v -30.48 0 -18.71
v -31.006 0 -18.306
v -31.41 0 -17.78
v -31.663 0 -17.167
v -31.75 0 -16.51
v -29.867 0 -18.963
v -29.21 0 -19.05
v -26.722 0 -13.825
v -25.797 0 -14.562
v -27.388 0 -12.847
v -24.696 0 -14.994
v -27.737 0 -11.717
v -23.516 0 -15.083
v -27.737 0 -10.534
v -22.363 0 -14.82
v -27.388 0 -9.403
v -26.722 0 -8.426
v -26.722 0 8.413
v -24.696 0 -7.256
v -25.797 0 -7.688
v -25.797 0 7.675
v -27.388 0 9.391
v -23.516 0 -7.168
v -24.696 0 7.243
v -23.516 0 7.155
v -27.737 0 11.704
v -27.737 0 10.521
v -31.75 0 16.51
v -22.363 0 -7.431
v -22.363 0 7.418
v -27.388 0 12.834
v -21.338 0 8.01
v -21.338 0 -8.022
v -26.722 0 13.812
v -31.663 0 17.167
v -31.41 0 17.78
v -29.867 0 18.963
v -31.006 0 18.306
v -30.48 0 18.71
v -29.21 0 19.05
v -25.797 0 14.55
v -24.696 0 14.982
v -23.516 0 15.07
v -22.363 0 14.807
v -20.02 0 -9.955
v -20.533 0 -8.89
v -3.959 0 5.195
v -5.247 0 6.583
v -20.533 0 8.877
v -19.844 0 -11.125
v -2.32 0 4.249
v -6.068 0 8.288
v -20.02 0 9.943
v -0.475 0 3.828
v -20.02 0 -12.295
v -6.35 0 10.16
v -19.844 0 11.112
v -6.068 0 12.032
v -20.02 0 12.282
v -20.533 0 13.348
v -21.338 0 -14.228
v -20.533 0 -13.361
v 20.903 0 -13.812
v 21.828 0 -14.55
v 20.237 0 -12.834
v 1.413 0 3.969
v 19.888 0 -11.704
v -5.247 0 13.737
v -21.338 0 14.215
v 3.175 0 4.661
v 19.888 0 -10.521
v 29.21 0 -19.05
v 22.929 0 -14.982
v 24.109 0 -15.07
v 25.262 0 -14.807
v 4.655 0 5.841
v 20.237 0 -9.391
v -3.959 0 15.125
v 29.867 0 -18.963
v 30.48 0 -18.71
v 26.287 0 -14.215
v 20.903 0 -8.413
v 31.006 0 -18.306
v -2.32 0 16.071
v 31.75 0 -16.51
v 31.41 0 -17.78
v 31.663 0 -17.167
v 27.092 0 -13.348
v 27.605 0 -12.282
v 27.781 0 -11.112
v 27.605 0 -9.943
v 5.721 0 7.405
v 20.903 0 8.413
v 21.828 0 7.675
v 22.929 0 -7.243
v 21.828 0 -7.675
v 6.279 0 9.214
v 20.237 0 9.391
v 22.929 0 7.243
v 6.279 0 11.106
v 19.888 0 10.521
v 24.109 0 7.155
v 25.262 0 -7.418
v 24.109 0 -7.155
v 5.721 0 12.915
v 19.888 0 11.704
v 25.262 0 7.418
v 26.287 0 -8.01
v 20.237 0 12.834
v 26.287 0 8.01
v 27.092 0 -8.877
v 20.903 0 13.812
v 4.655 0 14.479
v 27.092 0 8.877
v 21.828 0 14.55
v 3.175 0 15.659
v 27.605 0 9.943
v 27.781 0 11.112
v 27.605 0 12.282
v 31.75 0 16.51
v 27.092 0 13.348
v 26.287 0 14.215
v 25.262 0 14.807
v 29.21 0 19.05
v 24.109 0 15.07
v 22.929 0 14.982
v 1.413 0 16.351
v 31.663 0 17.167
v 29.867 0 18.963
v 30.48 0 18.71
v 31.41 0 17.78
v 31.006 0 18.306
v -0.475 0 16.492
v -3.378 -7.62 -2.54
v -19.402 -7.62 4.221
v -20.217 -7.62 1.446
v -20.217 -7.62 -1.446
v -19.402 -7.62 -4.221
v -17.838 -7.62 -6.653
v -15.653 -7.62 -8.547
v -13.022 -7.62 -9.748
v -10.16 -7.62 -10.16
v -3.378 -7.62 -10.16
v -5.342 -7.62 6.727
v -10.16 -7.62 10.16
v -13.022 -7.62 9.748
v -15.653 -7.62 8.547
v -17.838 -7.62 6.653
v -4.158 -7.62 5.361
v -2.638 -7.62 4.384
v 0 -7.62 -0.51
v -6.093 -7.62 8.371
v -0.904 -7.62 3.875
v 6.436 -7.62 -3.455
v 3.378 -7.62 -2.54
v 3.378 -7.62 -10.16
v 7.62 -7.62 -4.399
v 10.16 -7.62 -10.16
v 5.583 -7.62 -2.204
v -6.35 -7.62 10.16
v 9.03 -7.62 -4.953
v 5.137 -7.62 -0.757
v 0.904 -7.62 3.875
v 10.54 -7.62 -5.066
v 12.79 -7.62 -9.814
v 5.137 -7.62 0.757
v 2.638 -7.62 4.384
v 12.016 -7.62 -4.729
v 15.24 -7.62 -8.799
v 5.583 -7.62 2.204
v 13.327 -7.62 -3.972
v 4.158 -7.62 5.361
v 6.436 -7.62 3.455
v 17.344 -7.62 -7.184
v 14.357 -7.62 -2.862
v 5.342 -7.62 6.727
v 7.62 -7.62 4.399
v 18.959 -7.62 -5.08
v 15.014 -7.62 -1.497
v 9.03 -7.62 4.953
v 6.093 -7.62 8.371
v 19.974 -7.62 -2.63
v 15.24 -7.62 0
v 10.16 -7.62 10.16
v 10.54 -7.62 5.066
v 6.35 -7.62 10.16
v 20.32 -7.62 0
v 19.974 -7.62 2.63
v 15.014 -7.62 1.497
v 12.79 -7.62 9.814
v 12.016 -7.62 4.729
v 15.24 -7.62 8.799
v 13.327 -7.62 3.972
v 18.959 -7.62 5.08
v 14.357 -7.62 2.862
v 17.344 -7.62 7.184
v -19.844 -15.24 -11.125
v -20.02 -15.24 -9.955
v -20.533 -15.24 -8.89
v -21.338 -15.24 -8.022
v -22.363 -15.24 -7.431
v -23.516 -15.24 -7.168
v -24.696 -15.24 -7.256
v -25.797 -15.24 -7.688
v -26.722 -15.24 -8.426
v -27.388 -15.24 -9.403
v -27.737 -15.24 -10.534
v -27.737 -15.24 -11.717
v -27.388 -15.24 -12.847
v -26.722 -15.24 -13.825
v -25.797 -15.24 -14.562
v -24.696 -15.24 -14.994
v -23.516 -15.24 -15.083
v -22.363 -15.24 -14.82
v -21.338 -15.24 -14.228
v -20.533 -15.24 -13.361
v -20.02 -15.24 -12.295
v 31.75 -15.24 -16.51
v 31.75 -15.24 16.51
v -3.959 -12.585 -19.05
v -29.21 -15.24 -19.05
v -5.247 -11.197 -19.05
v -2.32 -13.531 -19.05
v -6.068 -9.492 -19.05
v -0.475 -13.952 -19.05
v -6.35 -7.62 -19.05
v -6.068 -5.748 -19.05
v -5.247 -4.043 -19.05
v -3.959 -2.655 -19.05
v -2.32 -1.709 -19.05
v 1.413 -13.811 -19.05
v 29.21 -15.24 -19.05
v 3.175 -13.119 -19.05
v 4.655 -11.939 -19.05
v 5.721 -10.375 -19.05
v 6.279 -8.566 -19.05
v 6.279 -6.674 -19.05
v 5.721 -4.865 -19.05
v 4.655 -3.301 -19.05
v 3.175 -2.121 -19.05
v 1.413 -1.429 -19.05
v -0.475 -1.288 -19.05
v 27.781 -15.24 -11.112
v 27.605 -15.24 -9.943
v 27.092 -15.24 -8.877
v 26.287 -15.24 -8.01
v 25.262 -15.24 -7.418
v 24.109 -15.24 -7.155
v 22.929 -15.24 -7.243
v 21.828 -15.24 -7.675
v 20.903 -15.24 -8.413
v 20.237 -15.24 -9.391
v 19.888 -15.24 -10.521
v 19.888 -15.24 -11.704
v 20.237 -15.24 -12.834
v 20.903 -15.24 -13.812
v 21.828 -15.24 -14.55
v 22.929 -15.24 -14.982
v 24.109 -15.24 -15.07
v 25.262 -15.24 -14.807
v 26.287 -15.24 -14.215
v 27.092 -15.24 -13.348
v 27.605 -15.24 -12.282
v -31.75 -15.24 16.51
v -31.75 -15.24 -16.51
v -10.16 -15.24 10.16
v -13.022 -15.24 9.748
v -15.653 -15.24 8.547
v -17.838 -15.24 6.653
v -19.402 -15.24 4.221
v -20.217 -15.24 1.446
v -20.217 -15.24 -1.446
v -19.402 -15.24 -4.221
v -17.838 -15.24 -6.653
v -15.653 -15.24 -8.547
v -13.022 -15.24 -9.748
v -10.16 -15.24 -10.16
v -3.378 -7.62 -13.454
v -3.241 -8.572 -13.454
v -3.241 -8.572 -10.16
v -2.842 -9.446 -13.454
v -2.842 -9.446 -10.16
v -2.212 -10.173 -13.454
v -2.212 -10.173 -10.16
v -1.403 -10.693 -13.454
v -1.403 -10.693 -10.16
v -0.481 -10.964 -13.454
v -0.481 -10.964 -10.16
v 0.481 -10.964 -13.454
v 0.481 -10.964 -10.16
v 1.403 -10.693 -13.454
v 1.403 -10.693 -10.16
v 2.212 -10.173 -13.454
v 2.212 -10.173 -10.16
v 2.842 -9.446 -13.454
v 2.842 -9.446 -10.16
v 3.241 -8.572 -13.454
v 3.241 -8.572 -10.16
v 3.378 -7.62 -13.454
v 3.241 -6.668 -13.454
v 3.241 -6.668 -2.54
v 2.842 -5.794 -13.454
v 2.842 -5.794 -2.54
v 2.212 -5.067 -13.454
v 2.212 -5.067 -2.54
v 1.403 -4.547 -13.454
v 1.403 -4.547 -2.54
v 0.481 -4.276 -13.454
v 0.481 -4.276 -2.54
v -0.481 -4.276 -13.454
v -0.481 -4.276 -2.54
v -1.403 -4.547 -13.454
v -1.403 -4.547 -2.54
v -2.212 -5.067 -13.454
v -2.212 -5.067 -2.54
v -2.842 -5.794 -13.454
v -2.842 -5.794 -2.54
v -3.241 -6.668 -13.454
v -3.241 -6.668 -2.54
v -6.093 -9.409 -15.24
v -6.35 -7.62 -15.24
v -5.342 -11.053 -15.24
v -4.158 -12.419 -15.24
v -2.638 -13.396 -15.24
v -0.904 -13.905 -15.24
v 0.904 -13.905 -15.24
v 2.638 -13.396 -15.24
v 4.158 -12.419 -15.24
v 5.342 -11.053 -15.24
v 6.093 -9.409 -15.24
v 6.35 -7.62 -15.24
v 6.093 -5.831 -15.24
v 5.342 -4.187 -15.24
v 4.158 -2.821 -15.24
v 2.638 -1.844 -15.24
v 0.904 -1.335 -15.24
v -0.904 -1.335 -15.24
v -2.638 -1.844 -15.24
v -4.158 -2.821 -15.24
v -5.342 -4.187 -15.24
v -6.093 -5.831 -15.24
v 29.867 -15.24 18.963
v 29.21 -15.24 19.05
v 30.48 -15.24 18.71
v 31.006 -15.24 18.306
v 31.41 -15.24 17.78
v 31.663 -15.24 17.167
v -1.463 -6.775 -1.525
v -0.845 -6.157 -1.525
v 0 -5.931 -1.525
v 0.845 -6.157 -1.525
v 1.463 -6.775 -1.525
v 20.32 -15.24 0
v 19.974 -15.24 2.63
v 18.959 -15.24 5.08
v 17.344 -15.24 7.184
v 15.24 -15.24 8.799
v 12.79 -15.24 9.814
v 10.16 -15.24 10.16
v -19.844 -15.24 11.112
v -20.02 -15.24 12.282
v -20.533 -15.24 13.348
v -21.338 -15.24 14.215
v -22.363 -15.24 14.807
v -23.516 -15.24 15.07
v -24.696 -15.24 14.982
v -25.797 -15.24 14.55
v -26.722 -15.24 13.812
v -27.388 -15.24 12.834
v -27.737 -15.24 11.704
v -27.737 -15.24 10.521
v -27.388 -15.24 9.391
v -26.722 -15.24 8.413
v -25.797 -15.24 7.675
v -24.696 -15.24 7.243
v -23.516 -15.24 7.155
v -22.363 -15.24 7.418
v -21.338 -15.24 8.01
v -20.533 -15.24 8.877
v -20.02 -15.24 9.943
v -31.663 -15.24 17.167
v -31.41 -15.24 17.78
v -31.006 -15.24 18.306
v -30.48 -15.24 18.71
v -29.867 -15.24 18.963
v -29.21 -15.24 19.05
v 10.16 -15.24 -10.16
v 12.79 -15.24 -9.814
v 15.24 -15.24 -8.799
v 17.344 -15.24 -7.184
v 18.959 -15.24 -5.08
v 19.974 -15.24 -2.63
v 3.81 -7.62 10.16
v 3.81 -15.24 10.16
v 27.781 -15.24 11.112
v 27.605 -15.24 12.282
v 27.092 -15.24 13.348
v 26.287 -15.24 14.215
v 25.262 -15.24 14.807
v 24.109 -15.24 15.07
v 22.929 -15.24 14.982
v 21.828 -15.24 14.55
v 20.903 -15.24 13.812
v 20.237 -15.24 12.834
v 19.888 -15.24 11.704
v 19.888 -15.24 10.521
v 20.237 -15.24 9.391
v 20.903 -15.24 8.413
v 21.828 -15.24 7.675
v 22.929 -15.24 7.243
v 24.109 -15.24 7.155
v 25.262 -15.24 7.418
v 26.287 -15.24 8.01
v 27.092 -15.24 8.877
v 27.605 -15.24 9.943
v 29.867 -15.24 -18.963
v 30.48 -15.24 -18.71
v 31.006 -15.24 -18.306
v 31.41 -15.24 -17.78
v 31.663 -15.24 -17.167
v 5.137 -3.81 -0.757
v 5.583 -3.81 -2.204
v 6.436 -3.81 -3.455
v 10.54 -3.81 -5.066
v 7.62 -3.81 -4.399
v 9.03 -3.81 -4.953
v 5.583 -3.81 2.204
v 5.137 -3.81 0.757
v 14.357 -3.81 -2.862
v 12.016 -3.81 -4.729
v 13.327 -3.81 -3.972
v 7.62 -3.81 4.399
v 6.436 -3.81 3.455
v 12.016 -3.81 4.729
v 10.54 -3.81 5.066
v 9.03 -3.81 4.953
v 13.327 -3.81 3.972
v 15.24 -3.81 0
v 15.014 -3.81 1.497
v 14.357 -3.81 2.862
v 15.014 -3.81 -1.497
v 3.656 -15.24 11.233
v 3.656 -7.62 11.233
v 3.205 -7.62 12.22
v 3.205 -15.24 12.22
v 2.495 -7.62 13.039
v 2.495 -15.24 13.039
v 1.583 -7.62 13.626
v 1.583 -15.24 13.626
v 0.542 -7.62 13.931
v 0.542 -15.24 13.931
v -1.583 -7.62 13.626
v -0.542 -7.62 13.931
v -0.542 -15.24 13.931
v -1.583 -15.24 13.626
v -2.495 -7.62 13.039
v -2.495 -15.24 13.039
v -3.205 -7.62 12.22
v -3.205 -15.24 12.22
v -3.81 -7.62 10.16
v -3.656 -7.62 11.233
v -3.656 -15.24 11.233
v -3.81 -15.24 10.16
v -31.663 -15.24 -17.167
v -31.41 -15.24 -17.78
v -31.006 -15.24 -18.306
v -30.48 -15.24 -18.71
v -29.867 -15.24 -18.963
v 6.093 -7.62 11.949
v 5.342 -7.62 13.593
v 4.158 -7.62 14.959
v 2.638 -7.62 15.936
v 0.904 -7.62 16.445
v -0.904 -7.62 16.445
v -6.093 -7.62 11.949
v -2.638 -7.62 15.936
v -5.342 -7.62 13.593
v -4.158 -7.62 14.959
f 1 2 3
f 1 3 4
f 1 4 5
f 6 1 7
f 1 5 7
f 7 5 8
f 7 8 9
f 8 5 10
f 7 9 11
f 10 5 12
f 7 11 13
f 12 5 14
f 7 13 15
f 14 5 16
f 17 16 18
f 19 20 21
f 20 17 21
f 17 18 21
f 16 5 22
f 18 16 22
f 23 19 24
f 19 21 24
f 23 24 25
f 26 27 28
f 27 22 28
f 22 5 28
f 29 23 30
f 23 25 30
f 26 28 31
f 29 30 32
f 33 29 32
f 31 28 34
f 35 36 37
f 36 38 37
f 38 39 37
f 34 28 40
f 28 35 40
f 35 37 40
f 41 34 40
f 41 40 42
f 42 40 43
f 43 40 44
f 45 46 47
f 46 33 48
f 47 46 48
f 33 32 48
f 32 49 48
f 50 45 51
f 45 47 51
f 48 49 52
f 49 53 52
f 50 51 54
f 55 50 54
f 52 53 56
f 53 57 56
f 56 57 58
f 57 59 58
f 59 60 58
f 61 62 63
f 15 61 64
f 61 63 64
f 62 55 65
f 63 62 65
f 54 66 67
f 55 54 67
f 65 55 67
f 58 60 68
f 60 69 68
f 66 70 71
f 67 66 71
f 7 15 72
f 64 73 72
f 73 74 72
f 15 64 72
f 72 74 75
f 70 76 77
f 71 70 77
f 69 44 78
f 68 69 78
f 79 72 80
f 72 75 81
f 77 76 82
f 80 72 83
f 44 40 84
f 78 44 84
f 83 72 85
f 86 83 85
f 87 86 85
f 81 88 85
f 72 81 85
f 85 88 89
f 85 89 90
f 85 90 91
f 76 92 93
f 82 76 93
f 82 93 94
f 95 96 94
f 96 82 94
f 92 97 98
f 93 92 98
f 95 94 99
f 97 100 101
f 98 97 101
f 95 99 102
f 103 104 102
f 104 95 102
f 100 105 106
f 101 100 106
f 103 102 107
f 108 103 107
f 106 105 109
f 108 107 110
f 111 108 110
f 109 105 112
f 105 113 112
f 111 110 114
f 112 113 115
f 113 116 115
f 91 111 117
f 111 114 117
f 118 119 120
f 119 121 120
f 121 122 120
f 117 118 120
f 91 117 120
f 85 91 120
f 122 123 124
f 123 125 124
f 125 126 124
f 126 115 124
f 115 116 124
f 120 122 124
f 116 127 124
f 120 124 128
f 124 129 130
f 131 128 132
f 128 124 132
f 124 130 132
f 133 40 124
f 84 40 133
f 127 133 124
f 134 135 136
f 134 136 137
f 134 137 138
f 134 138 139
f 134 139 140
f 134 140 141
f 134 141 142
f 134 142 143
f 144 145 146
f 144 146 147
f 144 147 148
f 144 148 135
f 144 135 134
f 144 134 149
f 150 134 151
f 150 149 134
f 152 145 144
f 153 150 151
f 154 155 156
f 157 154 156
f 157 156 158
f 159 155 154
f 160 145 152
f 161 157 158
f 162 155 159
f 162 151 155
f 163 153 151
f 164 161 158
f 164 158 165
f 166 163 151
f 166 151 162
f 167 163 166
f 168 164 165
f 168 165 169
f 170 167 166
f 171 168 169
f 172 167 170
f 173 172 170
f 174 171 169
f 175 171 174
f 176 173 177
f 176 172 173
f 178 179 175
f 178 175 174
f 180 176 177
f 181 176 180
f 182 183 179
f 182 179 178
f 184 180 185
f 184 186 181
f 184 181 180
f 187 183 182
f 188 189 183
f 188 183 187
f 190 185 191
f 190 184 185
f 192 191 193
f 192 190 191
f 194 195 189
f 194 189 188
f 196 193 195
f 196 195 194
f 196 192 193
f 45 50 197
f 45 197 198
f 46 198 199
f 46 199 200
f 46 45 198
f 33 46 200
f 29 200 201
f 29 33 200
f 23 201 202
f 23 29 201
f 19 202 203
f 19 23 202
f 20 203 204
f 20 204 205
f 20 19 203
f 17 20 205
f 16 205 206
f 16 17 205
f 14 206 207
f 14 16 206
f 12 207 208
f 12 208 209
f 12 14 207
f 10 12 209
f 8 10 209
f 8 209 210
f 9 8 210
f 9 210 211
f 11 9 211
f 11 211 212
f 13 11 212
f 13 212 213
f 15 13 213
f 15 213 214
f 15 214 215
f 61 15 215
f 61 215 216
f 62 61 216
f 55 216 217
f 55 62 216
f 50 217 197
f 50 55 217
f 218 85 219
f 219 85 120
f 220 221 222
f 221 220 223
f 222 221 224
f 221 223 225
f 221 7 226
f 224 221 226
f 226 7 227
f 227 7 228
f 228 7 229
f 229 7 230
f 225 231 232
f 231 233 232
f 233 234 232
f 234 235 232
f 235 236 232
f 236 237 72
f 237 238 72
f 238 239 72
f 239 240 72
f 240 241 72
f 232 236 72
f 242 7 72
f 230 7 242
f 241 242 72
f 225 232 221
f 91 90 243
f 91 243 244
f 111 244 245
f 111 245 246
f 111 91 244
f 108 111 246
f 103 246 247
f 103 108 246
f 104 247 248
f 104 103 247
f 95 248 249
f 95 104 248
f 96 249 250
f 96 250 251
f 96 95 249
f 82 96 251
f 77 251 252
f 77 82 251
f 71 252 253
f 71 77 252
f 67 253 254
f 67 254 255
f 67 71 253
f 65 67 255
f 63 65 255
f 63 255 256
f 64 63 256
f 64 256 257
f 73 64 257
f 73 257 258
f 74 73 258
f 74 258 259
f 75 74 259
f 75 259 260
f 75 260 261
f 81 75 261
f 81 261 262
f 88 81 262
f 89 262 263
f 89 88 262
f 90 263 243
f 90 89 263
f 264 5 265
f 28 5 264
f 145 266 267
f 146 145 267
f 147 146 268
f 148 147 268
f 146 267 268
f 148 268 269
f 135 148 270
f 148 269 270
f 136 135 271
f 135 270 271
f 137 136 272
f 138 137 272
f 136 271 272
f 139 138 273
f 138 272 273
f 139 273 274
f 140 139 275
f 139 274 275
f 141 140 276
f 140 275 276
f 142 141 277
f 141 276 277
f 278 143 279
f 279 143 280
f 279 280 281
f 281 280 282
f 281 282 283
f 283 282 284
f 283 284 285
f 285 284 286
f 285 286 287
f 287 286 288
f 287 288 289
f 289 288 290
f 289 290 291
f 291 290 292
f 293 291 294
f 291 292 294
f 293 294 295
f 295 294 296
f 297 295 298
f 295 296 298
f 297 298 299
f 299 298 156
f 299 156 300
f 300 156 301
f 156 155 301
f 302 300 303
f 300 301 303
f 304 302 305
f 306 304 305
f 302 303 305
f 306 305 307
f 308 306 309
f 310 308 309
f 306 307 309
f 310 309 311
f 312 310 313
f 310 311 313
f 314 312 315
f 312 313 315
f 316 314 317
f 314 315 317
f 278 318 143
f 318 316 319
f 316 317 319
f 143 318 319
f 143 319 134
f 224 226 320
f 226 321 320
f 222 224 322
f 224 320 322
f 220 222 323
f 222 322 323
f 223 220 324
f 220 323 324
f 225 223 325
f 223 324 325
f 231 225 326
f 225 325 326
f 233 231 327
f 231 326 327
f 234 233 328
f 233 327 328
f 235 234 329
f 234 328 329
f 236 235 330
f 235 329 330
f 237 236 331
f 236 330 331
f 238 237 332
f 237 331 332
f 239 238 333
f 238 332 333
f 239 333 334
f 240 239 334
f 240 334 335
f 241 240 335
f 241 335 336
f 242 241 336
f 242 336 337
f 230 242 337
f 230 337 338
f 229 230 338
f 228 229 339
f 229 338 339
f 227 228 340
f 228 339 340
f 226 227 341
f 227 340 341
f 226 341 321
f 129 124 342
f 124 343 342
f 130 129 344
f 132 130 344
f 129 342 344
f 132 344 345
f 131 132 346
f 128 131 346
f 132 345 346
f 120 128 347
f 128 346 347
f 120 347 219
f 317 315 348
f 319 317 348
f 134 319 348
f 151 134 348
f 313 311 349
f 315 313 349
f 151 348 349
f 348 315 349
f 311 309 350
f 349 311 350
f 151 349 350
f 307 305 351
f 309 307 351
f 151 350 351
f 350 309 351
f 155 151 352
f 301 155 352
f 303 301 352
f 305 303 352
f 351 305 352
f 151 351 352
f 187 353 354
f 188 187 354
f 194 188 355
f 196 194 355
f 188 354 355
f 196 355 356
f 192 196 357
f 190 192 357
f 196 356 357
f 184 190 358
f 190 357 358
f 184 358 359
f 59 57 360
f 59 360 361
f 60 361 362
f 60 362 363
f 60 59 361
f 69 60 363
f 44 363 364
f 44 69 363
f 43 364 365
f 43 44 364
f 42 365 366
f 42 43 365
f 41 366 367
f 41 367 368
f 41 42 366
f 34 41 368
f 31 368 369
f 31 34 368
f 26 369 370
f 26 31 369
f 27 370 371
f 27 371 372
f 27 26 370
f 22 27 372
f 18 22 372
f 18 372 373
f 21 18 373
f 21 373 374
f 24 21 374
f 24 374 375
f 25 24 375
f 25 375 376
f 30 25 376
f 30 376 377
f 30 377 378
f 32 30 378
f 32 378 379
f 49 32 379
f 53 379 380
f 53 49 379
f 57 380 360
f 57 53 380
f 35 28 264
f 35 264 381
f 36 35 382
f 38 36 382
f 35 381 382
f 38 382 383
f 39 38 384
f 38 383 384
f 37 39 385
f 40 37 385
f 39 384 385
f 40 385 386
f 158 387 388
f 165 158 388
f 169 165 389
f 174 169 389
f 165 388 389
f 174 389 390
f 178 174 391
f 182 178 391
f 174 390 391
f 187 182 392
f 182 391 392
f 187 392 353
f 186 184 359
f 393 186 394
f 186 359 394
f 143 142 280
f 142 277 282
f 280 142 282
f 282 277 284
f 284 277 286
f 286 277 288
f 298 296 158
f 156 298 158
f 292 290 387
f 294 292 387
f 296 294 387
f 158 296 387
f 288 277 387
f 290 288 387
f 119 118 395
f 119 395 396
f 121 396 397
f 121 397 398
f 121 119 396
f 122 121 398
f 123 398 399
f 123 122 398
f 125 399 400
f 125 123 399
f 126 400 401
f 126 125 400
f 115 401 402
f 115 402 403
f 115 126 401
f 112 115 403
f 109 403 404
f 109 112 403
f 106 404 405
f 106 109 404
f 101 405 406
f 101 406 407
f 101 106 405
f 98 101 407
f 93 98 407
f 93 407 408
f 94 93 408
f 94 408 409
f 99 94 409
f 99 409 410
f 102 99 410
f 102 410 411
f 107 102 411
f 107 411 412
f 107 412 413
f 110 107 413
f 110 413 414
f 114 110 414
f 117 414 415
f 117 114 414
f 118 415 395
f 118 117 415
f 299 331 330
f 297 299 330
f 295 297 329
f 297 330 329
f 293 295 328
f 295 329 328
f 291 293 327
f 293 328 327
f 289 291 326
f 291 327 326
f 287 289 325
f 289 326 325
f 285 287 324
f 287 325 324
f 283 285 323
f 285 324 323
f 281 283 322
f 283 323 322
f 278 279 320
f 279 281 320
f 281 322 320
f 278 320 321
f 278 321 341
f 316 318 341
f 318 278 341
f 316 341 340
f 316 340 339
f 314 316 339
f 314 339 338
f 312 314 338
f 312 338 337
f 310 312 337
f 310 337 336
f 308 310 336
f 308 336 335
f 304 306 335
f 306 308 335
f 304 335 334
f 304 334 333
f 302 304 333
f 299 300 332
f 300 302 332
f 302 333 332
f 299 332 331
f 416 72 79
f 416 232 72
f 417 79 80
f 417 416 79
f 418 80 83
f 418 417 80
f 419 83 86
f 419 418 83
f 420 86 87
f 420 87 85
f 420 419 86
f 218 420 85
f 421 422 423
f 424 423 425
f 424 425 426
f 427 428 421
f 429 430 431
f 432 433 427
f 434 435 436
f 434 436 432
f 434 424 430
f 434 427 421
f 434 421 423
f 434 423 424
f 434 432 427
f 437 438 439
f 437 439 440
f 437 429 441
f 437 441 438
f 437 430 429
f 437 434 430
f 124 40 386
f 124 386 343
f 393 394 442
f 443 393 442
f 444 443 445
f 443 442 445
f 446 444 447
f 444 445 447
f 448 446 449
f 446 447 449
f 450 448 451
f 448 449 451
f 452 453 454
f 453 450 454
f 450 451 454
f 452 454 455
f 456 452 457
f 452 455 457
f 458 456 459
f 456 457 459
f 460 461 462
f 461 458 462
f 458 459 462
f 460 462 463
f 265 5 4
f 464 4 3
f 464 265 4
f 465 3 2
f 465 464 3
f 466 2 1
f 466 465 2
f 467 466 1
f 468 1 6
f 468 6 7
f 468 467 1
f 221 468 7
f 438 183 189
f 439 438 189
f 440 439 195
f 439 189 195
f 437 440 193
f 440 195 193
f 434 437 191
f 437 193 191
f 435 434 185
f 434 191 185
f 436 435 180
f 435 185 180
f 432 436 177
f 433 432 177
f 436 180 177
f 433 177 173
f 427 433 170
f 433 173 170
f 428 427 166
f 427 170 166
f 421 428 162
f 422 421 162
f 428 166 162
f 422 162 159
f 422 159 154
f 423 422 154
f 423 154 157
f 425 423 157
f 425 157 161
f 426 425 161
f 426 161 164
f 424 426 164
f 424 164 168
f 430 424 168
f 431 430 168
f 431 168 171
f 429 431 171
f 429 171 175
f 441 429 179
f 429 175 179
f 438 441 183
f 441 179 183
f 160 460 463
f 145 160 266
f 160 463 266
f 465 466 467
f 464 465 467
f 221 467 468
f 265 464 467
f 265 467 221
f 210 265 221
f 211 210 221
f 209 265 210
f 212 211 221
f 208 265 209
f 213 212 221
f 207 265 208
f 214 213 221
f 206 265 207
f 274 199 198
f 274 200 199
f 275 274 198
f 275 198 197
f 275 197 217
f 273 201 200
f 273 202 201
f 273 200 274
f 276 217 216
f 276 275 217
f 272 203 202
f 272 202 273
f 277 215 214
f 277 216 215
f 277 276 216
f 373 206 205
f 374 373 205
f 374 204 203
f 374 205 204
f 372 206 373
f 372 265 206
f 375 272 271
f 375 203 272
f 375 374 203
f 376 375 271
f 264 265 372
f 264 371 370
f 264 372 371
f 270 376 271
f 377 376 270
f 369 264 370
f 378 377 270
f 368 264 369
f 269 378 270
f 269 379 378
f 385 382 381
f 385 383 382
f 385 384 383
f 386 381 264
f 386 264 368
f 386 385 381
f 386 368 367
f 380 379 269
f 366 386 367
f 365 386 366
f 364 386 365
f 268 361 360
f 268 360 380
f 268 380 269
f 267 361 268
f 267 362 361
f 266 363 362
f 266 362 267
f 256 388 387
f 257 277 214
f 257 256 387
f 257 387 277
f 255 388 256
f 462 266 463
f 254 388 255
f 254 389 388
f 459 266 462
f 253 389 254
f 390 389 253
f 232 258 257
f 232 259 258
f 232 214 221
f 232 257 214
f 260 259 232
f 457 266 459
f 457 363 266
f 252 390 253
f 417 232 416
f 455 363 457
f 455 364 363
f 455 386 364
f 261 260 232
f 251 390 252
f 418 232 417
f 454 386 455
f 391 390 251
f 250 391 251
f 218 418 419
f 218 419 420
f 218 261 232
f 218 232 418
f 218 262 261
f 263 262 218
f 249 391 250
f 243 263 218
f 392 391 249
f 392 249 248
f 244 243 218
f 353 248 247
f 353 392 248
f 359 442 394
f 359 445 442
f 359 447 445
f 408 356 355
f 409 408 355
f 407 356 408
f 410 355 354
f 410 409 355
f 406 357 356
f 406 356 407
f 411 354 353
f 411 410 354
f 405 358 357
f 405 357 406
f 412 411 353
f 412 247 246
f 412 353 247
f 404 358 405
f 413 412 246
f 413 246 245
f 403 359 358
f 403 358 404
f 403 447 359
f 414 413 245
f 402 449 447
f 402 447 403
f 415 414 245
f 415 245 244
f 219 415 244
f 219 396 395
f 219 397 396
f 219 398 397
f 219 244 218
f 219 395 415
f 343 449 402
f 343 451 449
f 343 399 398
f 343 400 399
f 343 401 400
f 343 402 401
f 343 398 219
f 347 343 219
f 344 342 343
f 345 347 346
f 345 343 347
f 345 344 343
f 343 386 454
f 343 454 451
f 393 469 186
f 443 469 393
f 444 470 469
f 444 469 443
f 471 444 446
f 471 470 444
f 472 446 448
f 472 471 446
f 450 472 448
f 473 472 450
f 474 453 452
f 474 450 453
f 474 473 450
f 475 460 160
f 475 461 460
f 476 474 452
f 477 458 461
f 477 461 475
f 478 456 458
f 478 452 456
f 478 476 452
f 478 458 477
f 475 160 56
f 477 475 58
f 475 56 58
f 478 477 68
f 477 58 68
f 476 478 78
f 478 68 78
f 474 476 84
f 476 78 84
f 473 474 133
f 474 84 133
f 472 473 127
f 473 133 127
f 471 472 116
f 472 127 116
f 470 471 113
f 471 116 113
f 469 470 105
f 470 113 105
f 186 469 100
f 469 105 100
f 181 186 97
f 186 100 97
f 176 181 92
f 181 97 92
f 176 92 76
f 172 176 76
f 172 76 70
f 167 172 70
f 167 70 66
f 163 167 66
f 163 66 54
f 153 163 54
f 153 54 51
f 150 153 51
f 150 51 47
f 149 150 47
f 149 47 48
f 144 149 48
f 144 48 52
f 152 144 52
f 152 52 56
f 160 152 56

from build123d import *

# Parameters (mm, degrees)
F0_W      = 63.5
F0_H      = 38.1
F0_R      = 3.96875
F1_DEPTH  = 15.24
F3_DEPTH  = 7.62
F4_R      = 5.08
F5_DEPTH  = 3.81
F7_DEPTH  = 25.4
F8_R      = 6.35
F8_R_2    = 3.81
F9_DEPTH  = 7.62
F11_D     = 6.7564
F11_DEPTH = 16.51
F11_TIP   = 2.0298273432
F13_D     = 12.7
F13_DEPTH = 3.81
F13_TIP   = 3.8154649308
F14_R     = 2.54


with BuildPart() as f1:
    # F0 (on Front) → F1 (new body)
    with BuildSketch(Plane.XZ):
        Rectangle(F0_W, F0_H)
        with Locations((-23.8125, -11.1252)):
            Circle(F0_R, mode=Mode.SUBTRACT)
        with Locations((23.8125, -11.1125)):
            Circle(F0_R, mode=Mode.SUBTRACT)
        with Locations((-23.8125, 11.1125)):
            Circle(F0_R, mode=Mode.SUBTRACT)
        with Locations((23.8125, 11.1125)):
            Circle(F0_R, mode=Mode.SUBTRACT)
    extrude(amount=F1_DEPTH)

    # F2 (on face) → F3 (cut)
    with BuildSketch(Plane.XZ.offset(15.24)):
        with BuildLine():
            ThreePointArc((10.16, -10.16), (17.3442048969, -7.1842048969), (20.32, 0))
            ThreePointArc((20.32, 0), (17.3442048969, 7.1842048969), (10.16, 10.16))
            ThreePointArc((10.16, 10.16), (2.9757951031, 7.1842048969), (0, 0))
            ThreePointArc((0, 0), (2.9757951031, -7.1842048969), (10.16, -10.16))
        make_face()
        with BuildLine():
            ThreePointArc((0, 0), (2.9757951031, 7.1842048969), (10.16, 10.16))
            Line((10.16, 10.16), (-10.16, 10.16))
            ThreePointArc((-10.16, 10.16), (-2.9757951031, 7.1842048969), (0, 0))
        make_face()
        with BuildLine():
            Line((-10.16, -10.16), (10.16, -10.16))
            ThreePointArc((10.16, -10.16), (2.9757951031, -7.1842048969), (0, 0))
            ThreePointArc((0, 0), (-2.9757951031, -7.1842048969), (-10.16, -10.16))
        make_face()
        with BuildLine():
            ThreePointArc((-10.16, -10.16), (-2.9757951031, -7.1842048969), (0, 0))
            ThreePointArc((0, 0), (-2.9757951031, 7.1842048969), (-10.16, 10.16))
            ThreePointArc((-10.16, 10.16), (-20.32, 0), (-10.16, -10.16))
        make_face()
    extrude(amount=-F3_DEPTH, mode=Mode.SUBTRACT)

    # F4 (on face) → F5 (cut)
    with BuildSketch(Plane.XZ.offset(7.62)):
        with Locations((10.16, 0)):
            Circle(F4_R)
    extrude(amount=-F5_DEPTH, mode=Mode.SUBTRACT)

    # F6 (on face) → F7 (cut)
    with BuildSketch(Plane.XZ.offset(15.24)):
        with BuildLine():
            ThreePointArc((-3.81, 10.16), (0, 6.35), (3.81, 10.16))
            Line((3.81, 10.16), (-3.81, 10.16))
        make_face()
        with BuildLine():
            Line((-3.81, 10.16), (3.81, 10.16))
            ThreePointArc((3.81, 10.16), (0, 13.97), (-3.81, 10.16))
        make_face()
    extrude(amount=-F7_DEPTH, mode=Mode.SUBTRACT)

    # F8 (on face) → F9 (cut)
    with BuildSketch(Plane(origin=(0, 0, 0), x_dir=(-1, 0, 0), z_dir=(0, 1, 0))):
        with Locations((0, 10.16)):
            Circle(F8_R)
        with Locations((0, 10.16)):
            Circle(F8_R_2, mode=Mode.SUBTRACT)
    extrude(amount=-F9_DEPTH, mode=Mode.SUBTRACT)

    # F11
    with Locations(Plane(origin=(0, 0, -19.05), x_dir=(1, 0, 0), z_dir=(0, 0, -1))):
        with Locations((0, 7.62)):
            Hole(F11_D / 2, depth=F11_DEPTH)
            with Locations((0, 0, -(F11_DEPTH + F11_TIP / 2))):  # 118° drill point
                Cone(0, F11_D / 2, F11_TIP, mode=Mode.SUBTRACT)

    # F13
    with Locations(Plane(origin=(0, 0, -19.05), x_dir=(1, 0, 0), z_dir=(0, 0, -1))):
        with Locations((0, 7.62)):
            Hole(F13_D / 2, depth=F13_DEPTH)
            with Locations((0, 0, -(F13_DEPTH + F13_TIP / 2))):  # 118° drill point
                Cone(0, F13_D / 2, F13_TIP, mode=Mode.SUBTRACT)

    # F14
    f14_edges = [f1.edges().sort_by_distance(p)[0] for p in [
        (31.75, -7.62, -19.05),
        (-31.75, -7.62, -19.05),
        (31.75, -7.62, 19.05),
        (-31.75, -7.62, 19.05),
    ]]
    fillet(f14_edges, radius=F14_R)


solid = f1.part
